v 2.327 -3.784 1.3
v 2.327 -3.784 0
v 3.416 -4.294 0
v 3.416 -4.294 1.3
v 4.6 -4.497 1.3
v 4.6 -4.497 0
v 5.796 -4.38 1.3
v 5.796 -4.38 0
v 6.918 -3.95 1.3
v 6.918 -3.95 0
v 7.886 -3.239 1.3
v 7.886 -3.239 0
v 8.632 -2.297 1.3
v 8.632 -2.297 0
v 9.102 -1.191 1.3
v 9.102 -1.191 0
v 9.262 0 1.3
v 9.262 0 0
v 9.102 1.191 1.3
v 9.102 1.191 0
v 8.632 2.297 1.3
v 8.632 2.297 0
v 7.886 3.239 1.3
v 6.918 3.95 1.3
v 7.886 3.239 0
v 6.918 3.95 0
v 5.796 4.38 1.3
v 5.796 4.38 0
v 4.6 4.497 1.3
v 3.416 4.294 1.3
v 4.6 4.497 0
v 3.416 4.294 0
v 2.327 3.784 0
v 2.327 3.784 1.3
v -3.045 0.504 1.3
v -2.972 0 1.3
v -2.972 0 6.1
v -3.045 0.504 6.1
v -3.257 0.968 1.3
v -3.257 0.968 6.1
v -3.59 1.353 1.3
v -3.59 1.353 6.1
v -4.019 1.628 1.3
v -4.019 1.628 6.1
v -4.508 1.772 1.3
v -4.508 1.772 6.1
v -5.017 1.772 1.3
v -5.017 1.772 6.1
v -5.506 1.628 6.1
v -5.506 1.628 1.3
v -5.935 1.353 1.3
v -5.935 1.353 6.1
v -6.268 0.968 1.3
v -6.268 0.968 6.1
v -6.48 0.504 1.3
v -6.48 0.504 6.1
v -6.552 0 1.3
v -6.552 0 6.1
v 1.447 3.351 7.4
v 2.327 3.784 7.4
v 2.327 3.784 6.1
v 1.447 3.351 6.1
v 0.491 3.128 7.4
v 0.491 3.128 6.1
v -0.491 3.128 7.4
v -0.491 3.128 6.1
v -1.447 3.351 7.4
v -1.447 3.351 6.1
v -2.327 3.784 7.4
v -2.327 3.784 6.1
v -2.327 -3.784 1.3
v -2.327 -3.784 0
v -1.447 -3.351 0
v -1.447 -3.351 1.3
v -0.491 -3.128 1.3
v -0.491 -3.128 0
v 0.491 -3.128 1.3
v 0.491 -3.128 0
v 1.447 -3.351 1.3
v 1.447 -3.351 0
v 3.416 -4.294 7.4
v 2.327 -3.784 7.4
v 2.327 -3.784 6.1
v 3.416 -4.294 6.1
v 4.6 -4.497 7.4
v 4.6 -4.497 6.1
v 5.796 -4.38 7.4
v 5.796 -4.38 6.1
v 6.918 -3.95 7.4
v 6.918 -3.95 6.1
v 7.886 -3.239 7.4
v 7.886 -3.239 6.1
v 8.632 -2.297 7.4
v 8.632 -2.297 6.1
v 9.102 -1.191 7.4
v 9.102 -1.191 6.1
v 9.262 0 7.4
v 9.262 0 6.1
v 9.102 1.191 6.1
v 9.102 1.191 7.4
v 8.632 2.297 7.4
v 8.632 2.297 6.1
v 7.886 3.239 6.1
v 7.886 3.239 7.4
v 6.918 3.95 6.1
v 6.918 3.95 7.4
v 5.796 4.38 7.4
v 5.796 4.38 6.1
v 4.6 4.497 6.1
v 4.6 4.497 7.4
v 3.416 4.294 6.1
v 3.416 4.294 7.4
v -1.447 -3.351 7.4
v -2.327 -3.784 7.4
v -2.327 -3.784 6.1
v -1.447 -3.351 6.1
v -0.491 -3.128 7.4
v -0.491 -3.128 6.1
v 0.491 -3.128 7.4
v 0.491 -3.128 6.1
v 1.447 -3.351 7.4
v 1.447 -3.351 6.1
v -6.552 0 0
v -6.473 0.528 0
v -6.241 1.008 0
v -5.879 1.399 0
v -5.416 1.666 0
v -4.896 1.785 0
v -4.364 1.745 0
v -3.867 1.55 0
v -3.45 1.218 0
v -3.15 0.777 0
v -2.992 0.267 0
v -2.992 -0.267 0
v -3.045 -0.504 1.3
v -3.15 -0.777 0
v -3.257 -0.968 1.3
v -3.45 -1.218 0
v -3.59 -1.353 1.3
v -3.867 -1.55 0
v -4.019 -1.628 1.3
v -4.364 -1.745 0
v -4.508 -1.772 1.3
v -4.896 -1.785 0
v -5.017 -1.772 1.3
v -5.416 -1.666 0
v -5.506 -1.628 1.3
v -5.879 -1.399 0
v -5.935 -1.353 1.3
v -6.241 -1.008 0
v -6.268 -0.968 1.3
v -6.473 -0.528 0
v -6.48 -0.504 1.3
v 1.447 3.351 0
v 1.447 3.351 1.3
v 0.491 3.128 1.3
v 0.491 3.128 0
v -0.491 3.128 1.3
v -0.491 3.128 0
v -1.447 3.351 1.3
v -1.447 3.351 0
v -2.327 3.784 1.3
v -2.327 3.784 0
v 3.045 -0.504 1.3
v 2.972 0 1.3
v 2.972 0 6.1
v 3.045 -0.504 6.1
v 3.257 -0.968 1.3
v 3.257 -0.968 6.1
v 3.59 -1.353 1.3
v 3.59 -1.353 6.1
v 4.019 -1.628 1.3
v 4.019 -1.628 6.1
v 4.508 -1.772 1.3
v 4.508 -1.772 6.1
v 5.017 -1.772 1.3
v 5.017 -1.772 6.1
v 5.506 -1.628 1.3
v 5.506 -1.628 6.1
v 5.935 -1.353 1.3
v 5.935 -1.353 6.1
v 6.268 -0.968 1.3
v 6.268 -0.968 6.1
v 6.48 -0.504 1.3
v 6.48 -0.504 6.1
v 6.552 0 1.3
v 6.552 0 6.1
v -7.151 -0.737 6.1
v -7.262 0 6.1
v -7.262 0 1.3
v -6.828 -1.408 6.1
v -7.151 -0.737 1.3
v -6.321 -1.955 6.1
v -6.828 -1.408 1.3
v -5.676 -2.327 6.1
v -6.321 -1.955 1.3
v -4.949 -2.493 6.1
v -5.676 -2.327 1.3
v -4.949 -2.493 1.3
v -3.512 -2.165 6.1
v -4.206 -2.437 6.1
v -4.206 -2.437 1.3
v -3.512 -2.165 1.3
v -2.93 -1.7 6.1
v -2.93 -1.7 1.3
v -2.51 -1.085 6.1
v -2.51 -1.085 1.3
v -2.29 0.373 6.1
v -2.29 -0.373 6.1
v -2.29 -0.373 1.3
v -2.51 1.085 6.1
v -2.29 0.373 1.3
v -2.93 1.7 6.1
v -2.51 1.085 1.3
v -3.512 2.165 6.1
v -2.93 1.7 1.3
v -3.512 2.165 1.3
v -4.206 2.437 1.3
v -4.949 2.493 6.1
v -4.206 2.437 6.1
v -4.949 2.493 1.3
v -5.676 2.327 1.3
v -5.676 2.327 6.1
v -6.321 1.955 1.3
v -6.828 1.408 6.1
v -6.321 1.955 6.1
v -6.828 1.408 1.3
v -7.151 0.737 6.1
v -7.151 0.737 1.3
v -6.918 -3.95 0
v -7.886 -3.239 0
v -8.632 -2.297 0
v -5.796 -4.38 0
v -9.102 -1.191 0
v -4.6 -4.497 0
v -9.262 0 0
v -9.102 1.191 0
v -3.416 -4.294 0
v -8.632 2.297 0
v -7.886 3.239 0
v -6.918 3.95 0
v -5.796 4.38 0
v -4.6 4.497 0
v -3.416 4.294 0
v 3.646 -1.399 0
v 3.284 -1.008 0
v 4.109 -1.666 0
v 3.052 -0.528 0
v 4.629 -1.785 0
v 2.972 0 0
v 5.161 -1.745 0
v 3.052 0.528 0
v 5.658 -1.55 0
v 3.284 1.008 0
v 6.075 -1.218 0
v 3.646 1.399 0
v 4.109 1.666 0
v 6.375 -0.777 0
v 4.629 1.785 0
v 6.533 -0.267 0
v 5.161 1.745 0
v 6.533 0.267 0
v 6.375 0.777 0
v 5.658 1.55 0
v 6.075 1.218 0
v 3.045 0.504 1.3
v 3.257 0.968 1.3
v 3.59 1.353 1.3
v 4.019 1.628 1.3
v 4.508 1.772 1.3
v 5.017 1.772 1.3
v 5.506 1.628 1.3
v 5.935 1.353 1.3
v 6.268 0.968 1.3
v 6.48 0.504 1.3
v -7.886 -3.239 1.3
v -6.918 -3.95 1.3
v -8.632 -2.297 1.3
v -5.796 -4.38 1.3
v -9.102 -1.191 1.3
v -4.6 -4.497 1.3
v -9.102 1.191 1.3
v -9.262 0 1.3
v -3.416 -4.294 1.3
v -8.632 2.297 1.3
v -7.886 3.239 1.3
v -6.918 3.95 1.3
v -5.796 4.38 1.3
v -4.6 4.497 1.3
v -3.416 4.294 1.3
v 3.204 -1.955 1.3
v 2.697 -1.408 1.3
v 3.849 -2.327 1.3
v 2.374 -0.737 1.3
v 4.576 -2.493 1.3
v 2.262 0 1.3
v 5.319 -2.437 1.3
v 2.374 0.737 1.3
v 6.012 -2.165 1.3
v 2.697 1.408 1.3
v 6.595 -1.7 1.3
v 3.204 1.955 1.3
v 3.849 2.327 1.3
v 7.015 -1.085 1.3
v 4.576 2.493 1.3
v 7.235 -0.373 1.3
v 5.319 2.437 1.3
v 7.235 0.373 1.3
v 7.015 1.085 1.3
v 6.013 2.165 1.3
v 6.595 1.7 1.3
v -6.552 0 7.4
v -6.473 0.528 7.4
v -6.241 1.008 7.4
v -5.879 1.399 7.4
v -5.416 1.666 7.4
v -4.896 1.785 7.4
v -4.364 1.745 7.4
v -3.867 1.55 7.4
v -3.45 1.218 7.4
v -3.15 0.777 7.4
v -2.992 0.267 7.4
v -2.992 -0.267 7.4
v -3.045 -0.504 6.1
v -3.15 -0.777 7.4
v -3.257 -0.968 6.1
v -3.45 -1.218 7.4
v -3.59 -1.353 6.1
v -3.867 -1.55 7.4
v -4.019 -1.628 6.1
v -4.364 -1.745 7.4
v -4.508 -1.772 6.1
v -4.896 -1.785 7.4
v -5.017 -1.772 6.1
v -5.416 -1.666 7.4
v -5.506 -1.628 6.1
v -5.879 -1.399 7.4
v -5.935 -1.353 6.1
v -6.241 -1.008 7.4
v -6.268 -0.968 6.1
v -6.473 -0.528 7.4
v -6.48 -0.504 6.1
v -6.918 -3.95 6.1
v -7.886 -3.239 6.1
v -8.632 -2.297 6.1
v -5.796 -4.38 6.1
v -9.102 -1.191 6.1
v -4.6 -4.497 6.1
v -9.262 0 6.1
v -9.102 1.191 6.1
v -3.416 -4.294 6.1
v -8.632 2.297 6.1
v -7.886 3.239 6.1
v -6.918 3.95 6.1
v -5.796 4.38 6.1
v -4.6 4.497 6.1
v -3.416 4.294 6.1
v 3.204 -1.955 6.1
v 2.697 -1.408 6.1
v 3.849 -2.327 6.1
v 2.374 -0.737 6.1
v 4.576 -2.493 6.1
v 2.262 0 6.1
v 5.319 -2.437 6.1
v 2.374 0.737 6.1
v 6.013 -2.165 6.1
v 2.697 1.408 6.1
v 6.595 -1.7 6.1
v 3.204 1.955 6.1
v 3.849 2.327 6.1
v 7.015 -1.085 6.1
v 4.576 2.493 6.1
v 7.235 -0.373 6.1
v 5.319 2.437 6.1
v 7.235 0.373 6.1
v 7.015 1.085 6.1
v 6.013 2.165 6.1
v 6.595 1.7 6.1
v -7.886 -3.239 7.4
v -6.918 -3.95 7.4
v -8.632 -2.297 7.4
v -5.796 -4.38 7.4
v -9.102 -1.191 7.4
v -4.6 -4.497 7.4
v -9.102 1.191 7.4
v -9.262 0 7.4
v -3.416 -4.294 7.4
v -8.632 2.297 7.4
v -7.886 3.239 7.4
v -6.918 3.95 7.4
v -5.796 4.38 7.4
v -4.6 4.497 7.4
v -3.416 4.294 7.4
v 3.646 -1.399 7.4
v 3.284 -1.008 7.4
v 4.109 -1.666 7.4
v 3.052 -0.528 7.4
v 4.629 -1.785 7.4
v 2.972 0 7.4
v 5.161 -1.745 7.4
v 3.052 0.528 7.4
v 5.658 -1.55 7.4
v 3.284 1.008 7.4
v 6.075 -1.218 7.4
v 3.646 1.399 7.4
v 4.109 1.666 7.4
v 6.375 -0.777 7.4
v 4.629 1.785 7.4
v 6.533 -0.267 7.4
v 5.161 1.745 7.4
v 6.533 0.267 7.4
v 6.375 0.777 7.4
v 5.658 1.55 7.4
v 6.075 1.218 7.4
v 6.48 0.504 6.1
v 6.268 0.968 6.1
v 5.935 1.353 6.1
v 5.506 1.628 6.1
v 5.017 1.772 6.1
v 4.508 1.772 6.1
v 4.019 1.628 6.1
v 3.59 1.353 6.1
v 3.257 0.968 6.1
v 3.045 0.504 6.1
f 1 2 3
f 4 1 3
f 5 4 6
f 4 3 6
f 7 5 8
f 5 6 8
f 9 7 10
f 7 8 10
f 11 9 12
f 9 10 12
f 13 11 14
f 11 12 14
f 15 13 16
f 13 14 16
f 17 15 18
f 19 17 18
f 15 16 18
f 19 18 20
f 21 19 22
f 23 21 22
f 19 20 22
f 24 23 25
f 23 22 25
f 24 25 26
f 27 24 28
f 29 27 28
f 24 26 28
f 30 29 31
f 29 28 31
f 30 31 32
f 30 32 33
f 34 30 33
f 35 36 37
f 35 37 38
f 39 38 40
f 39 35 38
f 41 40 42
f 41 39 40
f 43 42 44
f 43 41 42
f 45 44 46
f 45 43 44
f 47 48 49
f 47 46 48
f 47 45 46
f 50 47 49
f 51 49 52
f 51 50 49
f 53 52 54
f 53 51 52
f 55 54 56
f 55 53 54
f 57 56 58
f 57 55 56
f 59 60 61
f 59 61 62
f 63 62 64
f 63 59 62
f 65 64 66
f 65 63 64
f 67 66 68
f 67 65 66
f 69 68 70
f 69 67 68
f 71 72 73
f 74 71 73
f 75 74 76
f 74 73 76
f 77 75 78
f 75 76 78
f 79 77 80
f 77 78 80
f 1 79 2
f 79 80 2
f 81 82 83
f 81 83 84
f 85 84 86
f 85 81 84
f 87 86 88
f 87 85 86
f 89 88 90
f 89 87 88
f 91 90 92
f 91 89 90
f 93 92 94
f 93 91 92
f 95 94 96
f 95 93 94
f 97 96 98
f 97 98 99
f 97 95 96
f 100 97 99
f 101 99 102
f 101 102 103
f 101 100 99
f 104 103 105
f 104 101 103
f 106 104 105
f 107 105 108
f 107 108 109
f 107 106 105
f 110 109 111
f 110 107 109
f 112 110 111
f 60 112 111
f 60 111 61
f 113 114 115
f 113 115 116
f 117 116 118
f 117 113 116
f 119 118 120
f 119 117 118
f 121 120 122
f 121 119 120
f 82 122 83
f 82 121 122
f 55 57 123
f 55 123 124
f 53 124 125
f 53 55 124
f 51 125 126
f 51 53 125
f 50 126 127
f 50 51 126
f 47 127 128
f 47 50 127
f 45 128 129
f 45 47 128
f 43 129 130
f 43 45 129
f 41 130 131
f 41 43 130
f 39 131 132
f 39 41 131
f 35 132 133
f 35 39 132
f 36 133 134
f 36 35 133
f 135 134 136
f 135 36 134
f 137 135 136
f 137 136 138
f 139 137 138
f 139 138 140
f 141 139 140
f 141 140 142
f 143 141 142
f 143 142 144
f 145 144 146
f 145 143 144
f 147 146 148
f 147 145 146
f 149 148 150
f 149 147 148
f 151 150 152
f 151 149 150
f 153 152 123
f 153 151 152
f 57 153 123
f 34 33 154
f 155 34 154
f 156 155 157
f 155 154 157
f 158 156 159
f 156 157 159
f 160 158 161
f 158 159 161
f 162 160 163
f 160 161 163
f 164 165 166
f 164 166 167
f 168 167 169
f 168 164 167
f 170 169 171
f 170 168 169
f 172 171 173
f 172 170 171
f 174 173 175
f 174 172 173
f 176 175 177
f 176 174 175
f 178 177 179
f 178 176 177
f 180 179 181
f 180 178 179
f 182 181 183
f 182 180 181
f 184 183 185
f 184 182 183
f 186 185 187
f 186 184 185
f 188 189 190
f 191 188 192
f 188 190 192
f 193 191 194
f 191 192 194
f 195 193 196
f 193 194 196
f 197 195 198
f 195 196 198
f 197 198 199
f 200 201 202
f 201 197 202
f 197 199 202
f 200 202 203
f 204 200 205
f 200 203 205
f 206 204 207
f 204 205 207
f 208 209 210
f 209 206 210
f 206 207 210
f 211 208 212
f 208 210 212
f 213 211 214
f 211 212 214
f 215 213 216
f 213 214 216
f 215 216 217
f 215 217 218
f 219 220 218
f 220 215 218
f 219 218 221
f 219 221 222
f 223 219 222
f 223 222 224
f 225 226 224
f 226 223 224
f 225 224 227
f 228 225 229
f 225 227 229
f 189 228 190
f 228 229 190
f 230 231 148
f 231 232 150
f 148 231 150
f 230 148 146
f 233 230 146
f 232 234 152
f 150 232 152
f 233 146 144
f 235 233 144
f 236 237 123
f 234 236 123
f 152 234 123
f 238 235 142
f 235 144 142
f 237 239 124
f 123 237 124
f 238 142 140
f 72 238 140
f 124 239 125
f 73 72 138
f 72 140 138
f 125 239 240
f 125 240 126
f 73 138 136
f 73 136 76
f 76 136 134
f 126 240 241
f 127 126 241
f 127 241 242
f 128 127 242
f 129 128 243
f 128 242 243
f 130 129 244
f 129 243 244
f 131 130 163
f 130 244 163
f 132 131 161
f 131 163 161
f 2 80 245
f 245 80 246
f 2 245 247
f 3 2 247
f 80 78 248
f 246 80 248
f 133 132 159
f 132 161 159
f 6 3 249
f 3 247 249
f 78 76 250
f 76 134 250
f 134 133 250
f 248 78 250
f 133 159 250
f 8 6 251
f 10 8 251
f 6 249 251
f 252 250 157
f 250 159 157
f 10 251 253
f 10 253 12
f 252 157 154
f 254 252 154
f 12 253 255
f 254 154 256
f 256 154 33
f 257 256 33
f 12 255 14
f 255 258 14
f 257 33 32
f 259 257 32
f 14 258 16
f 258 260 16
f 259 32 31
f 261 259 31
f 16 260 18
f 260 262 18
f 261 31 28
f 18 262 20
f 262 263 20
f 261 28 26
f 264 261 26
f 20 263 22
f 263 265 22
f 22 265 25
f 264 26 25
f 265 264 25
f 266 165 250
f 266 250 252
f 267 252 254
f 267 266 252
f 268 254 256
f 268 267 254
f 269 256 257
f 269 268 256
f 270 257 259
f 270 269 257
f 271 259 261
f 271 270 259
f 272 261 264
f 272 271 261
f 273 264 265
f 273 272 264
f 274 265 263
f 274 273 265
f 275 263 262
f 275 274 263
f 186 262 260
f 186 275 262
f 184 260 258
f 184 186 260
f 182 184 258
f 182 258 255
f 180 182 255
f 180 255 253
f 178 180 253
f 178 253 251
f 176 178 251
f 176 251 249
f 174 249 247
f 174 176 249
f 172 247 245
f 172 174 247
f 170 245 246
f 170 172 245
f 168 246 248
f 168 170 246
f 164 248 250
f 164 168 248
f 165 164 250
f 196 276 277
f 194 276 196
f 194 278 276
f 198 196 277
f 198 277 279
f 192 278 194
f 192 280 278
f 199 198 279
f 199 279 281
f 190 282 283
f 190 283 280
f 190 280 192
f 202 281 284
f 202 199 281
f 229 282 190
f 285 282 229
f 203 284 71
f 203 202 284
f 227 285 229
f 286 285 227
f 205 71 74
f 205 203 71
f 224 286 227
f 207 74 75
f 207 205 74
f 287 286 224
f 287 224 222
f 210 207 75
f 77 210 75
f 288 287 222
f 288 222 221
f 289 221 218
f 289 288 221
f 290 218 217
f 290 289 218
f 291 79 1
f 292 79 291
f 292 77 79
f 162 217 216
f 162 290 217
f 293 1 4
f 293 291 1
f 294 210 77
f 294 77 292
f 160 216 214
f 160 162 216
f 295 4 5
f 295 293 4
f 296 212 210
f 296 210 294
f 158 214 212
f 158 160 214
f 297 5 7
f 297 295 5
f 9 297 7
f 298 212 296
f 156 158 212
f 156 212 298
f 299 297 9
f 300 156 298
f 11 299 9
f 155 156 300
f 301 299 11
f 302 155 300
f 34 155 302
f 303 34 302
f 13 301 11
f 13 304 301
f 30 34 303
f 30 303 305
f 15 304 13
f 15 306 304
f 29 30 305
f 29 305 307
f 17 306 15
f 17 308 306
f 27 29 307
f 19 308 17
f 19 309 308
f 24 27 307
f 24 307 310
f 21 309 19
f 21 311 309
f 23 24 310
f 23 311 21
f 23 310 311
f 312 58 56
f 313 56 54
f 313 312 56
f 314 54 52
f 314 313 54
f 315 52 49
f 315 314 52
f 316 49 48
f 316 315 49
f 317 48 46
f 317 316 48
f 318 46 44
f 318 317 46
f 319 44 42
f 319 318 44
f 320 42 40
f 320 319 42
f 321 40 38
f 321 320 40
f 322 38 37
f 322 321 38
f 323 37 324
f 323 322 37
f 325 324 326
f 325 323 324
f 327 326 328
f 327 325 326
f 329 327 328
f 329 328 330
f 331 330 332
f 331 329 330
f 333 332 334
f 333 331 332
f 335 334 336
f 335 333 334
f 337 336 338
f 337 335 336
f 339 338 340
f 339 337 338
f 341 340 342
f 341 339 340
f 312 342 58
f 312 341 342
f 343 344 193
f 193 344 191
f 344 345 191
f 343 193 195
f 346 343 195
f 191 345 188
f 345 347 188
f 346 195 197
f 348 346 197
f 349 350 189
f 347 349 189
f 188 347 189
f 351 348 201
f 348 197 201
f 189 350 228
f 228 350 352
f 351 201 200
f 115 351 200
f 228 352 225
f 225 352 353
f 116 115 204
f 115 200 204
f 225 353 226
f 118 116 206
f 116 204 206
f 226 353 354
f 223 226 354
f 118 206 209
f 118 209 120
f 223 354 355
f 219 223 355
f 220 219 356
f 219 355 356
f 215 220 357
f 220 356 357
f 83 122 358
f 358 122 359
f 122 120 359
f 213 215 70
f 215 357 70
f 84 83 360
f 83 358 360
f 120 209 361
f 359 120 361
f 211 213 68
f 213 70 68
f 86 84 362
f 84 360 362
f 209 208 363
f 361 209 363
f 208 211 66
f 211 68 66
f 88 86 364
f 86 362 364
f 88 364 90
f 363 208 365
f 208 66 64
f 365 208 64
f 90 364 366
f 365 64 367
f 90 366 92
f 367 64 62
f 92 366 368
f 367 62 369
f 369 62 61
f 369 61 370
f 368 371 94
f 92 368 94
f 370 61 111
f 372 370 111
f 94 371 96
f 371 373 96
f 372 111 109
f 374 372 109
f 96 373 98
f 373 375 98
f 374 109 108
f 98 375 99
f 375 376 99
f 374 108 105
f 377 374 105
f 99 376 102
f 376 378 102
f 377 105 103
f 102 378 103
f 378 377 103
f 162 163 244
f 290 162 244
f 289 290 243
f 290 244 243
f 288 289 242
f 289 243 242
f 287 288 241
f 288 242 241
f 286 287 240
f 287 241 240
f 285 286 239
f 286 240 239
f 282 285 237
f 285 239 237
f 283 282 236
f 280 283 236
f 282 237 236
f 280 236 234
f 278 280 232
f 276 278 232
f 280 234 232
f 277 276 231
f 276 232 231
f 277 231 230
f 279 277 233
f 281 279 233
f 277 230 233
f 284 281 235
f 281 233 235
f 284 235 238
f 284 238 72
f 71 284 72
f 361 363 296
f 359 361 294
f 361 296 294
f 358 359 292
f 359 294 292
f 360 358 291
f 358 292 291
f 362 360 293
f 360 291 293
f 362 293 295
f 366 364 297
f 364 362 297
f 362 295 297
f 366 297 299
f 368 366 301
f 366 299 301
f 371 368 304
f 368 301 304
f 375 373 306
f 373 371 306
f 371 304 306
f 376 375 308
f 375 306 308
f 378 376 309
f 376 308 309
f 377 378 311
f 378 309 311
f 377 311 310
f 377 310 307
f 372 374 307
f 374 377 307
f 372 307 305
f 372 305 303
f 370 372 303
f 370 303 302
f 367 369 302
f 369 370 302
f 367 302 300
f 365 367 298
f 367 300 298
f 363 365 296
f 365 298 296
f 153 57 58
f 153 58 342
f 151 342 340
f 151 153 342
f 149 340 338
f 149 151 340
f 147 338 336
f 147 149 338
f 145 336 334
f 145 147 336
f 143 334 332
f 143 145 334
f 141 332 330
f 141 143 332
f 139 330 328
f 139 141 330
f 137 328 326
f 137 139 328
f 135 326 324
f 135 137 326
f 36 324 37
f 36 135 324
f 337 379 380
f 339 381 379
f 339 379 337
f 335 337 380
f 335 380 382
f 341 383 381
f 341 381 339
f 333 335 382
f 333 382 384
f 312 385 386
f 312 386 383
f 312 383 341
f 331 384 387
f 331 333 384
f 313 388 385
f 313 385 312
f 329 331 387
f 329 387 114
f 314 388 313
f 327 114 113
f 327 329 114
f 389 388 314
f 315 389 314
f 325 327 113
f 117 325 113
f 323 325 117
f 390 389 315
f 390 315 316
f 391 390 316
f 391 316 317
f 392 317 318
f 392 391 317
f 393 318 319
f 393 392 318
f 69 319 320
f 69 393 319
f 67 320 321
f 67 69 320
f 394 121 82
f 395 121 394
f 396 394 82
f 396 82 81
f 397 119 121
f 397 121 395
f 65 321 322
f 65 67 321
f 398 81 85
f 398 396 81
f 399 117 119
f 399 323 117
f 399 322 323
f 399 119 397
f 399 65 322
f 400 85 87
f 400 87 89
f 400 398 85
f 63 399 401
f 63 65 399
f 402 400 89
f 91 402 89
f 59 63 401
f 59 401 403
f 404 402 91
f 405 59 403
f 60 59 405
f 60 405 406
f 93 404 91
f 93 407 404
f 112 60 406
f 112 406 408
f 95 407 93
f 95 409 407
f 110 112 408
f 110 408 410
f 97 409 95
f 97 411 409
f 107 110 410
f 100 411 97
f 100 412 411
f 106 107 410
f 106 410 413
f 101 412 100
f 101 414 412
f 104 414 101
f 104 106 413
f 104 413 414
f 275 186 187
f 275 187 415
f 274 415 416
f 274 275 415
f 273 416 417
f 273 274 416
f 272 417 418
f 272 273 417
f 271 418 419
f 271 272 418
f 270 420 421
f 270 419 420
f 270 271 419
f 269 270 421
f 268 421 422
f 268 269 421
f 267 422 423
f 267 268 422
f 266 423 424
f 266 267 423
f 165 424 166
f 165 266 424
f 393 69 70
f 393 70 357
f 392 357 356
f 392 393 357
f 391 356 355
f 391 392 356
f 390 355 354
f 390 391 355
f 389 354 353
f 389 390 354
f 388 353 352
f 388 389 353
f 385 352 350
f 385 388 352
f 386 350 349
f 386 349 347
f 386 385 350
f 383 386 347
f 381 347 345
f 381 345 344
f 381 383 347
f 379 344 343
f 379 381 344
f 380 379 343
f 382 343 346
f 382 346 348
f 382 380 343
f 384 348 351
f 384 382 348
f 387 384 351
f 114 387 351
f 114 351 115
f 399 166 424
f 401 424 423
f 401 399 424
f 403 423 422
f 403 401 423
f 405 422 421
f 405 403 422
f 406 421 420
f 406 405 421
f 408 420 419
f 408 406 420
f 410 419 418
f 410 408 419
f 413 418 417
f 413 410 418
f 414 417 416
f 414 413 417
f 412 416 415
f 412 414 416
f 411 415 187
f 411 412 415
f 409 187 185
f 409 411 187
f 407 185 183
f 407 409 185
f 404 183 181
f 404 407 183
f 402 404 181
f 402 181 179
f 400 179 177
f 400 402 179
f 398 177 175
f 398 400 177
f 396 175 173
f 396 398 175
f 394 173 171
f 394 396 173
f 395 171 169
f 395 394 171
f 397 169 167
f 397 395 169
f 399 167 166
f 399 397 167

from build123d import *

# Parameters (mm, degrees)
BOSS_EXTRUDE1_DEPTH     = 1.3
SKETCH2_R               = 2.5
SKETCH2_R_2             = 1.79
BOSS_EXTRUDE2_DEPTH     = 5
CUT_EXTRUDE1_DEPTH      = 11.942298947
CUT_EXTRUDE1_DEPTH_BACK = 11.942298947
SKETCH4_R               = 1.79


with BuildPart() as part:
    # Sketch1 → Boss-Extrude1 (new body)
    with BuildSketch(Plane.XY):
        with BuildLine():
            ThreePointArc((-2.327269665, 3.784131765), (-9.2625, 0), (-2.327269665, -3.784131765))
            ThreePointArc((-2.327269665, -3.784131765), (0, -3.1), (2.327269665, -3.784131765))
            ThreePointArc((2.327269665, -3.784131765), (9.2625, 0), (2.327269665, 3.784131765))
            ThreePointArc((2.327269665, 3.784131765), (0, 3.1), (-2.327269665, 3.784131765))
        make_face()
    boss_extrude1 = extrude(amount=BOSS_EXTRUDE1_DEPTH)

    # Sketch2 → Boss-Extrude2 (add)
    # profile 1 of 2: a face of its own
    with BuildSketch(Plane.XY.offset(1.3)):
        with Locations(Location((-4.7625, 0, 0), (0, 0, 180))):
            Circle(SKETCH2_R)
        with Locations((-4.7625, 0)):
            Circle(SKETCH2_R_2, mode=Mode.SUBTRACT)
    # profile 2 of 2: a face of its own
    with BuildSketch(Plane.XY.offset(1.3)):
        with Locations(Location((4.7625, 0, 0), (0, 0, 180))):
            Circle(SKETCH2_R)
        with Locations((4.7625, 0)):
            Circle(SKETCH2_R_2, mode=Mode.SUBTRACT)
    extrude(amount=BOSS_EXTRUDE2_DEPTH)

    # Mirror5: Boss-Extrude1 across plane
    add(boss_extrude1.mirror(Plane(origin=(0, 0, 3.7), x_dir=(1, 0, 0), z_dir=(0, 0, -1))))

    # Sketch4 → Cut-Extrude1 (cut, two sides: drawn at the far end of the back side and taken through both)
    with BuildSketch(Plane(origin=(0, 0, 3.7), x_dir=(-1, 0, 0), z_dir=(0, 0, -1)).offset(-CUT_EXTRUDE1_DEPTH_BACK)):
        with Locations((-4.7625, 0)):
            Circle(SKETCH4_R)
        with Locations((4.7625, 0)):
            Circle(SKETCH4_R)
    extrude(amount=CUT_EXTRUDE1_DEPTH + CUT_EXTRUDE1_DEPTH_BACK, mode=Mode.SUBTRACT)


solid = part.part
